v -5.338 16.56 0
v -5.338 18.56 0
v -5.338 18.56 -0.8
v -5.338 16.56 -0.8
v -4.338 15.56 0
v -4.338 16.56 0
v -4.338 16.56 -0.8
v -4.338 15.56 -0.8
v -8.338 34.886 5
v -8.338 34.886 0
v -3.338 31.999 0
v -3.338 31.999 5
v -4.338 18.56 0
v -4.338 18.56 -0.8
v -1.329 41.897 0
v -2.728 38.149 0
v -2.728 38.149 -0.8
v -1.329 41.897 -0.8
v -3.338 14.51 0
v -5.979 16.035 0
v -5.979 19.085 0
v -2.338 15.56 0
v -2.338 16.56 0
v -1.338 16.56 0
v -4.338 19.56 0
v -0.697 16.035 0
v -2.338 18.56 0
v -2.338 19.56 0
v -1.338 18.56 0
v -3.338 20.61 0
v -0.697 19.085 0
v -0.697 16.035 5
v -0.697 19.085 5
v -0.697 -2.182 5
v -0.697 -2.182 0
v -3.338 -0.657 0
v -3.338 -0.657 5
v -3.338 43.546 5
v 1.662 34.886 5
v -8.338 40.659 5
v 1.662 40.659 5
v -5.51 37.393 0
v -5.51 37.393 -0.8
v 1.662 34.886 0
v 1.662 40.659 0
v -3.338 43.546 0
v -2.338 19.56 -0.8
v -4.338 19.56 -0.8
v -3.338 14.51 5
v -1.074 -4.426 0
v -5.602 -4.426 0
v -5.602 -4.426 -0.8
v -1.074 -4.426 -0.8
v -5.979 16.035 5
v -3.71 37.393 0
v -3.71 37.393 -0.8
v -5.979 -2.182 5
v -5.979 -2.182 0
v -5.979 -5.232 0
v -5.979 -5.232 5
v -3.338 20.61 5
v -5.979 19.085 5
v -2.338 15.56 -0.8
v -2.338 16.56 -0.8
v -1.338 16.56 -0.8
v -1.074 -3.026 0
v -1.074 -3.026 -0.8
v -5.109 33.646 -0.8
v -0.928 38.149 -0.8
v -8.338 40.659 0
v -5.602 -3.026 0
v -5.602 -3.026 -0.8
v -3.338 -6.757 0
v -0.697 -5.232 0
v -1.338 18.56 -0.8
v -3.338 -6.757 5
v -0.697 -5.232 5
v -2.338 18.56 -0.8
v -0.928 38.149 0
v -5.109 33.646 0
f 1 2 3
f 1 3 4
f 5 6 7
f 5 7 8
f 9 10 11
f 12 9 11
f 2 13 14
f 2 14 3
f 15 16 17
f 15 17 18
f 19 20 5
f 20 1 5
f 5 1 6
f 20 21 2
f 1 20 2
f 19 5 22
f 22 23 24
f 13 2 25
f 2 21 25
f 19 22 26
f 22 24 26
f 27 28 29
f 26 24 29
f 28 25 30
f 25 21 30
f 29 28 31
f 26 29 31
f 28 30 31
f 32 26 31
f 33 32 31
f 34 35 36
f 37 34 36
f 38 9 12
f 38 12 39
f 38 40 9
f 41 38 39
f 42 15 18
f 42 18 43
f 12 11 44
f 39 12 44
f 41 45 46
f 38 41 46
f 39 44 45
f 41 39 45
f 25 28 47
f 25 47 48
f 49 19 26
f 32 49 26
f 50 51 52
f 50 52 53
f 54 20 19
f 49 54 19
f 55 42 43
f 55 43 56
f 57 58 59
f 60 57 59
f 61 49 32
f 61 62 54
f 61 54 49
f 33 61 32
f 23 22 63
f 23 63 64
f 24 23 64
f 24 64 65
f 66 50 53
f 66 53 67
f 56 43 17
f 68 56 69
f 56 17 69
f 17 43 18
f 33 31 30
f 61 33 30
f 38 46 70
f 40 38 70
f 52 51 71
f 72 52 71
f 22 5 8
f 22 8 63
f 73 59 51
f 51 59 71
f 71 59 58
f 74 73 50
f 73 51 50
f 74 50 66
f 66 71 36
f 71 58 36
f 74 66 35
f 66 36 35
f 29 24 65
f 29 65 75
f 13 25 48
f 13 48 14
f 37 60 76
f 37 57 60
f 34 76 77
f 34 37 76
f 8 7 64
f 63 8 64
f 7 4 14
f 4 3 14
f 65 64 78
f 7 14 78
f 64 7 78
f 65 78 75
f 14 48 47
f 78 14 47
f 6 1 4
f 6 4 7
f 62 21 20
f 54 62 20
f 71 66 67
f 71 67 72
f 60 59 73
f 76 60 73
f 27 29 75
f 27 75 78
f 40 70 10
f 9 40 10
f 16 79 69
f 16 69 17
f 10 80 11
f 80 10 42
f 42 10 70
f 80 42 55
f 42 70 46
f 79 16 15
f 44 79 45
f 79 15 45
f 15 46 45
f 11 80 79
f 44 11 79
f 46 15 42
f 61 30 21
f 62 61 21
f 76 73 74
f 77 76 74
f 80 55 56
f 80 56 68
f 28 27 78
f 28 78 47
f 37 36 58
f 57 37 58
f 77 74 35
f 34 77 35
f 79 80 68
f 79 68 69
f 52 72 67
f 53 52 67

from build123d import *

# Parameters (mm, degrees)
F2_DEPTH = 5
F3_DEPTH = 0.8
F1_W     = 2.2638370283
F1_H     = 1.4


with BuildPart() as f2:
    # F0 (on Top) → F2 (new body)
    with BuildSketch(Plane.XY):
        Polygon((-3.3380598761, 14.5100246476), (-0.6966823946, 16.0350246476), (-0.6966823946, 19.0850246476), (-3.3380598761, 20.6100246476), (-5.9794373577, 19.0850246476), (-5.9794373577, 16.0350246476), align=None)
    extrude(amount=F2_DEPTH)

    # F1 (on Top) → F3, piece 2 (join)
    with BuildSketch(Plane.XY):
        Polygon((-1.3380598761, 17.5600246476), (-5.3380598761, 17.5600246476), (-5.3380598761, 16.5600246476), (-4.3380598761, 16.5600246476), (-4.3380598761, 15.5600246476), (-2.3380598761, 15.5600246476), (-2.3380598761, 16.5600246476), (-1.3380598761, 16.5600246476), align=None)
        Polygon((-5.3380598761, 18.5600246476), (-5.3380598761, 17.5600246476), (-1.3380598761, 17.5600246476), (-1.3380598761, 18.5600246476), (-2.3380598761, 18.5600246476), (-2.3380598761, 19.5600246476), (-4.3380598761, 19.5600246476), (-4.3380598761, 18.5600246476), align=None)
    extrude(amount=-F3_DEPTH)


with BuildPart() as f2b:
    # F0 (on Top) → F2, piece 2 (new body)
    with BuildSketch(Plane.XY):
        Polygon((-5.979437381, -5.2322964184), (-3.3380598995, -6.7572964184), (-0.6966824179, -5.2322964184), (-0.6966824179, -2.1822964184), (-3.3380598995, -0.6572964184), (-5.979437381, -2.1822964184), align=None)
    extrude(amount=F2_DEPTH)

    # F1 (on Top) → F3, piece 3 (join)
    with BuildSketch(Plane.XY):
        with Locations((-2.206141362, -3.7255681834)):
            Rectangle(F1_W, F1_H)
        with Locations((-4.4699783903, -3.7255681834)):
            Rectangle(F1_W, F1_H)
    extrude(amount=-F3_DEPTH)


with BuildPart() as f2c:
    # F0 (on Top) → F2, piece 3 (new body)
    with BuildSketch(Plane.XY):
        Polygon((-8.3380575449, 34.8855292327), (-3.3380598761, 31.9987792327), (1.6619377926, 34.8855292327), (1.6619377926, 40.6590292327), (-3.3380598761, 43.5457792327), (-8.3380575449, 40.6590292327), align=None)
    extrude(amount=F2_DEPTH)

    # F1 (on Top) → F3 (join)
    with BuildSketch(Plane.XY):
        Polygon((-0.9281197149, 38.1491725842), (-2.7281197149, 38.1491725842), (-1.3290444063, 41.8965167478), (-5.5102869956, 37.3933391249), (-3.7102869956, 37.3933391249), (-5.1093623042, 33.6459949613), align=None)
    extrude(amount=-F3_DEPTH)


solid = Compound([f2.part, f2b.part, f2c.part])
